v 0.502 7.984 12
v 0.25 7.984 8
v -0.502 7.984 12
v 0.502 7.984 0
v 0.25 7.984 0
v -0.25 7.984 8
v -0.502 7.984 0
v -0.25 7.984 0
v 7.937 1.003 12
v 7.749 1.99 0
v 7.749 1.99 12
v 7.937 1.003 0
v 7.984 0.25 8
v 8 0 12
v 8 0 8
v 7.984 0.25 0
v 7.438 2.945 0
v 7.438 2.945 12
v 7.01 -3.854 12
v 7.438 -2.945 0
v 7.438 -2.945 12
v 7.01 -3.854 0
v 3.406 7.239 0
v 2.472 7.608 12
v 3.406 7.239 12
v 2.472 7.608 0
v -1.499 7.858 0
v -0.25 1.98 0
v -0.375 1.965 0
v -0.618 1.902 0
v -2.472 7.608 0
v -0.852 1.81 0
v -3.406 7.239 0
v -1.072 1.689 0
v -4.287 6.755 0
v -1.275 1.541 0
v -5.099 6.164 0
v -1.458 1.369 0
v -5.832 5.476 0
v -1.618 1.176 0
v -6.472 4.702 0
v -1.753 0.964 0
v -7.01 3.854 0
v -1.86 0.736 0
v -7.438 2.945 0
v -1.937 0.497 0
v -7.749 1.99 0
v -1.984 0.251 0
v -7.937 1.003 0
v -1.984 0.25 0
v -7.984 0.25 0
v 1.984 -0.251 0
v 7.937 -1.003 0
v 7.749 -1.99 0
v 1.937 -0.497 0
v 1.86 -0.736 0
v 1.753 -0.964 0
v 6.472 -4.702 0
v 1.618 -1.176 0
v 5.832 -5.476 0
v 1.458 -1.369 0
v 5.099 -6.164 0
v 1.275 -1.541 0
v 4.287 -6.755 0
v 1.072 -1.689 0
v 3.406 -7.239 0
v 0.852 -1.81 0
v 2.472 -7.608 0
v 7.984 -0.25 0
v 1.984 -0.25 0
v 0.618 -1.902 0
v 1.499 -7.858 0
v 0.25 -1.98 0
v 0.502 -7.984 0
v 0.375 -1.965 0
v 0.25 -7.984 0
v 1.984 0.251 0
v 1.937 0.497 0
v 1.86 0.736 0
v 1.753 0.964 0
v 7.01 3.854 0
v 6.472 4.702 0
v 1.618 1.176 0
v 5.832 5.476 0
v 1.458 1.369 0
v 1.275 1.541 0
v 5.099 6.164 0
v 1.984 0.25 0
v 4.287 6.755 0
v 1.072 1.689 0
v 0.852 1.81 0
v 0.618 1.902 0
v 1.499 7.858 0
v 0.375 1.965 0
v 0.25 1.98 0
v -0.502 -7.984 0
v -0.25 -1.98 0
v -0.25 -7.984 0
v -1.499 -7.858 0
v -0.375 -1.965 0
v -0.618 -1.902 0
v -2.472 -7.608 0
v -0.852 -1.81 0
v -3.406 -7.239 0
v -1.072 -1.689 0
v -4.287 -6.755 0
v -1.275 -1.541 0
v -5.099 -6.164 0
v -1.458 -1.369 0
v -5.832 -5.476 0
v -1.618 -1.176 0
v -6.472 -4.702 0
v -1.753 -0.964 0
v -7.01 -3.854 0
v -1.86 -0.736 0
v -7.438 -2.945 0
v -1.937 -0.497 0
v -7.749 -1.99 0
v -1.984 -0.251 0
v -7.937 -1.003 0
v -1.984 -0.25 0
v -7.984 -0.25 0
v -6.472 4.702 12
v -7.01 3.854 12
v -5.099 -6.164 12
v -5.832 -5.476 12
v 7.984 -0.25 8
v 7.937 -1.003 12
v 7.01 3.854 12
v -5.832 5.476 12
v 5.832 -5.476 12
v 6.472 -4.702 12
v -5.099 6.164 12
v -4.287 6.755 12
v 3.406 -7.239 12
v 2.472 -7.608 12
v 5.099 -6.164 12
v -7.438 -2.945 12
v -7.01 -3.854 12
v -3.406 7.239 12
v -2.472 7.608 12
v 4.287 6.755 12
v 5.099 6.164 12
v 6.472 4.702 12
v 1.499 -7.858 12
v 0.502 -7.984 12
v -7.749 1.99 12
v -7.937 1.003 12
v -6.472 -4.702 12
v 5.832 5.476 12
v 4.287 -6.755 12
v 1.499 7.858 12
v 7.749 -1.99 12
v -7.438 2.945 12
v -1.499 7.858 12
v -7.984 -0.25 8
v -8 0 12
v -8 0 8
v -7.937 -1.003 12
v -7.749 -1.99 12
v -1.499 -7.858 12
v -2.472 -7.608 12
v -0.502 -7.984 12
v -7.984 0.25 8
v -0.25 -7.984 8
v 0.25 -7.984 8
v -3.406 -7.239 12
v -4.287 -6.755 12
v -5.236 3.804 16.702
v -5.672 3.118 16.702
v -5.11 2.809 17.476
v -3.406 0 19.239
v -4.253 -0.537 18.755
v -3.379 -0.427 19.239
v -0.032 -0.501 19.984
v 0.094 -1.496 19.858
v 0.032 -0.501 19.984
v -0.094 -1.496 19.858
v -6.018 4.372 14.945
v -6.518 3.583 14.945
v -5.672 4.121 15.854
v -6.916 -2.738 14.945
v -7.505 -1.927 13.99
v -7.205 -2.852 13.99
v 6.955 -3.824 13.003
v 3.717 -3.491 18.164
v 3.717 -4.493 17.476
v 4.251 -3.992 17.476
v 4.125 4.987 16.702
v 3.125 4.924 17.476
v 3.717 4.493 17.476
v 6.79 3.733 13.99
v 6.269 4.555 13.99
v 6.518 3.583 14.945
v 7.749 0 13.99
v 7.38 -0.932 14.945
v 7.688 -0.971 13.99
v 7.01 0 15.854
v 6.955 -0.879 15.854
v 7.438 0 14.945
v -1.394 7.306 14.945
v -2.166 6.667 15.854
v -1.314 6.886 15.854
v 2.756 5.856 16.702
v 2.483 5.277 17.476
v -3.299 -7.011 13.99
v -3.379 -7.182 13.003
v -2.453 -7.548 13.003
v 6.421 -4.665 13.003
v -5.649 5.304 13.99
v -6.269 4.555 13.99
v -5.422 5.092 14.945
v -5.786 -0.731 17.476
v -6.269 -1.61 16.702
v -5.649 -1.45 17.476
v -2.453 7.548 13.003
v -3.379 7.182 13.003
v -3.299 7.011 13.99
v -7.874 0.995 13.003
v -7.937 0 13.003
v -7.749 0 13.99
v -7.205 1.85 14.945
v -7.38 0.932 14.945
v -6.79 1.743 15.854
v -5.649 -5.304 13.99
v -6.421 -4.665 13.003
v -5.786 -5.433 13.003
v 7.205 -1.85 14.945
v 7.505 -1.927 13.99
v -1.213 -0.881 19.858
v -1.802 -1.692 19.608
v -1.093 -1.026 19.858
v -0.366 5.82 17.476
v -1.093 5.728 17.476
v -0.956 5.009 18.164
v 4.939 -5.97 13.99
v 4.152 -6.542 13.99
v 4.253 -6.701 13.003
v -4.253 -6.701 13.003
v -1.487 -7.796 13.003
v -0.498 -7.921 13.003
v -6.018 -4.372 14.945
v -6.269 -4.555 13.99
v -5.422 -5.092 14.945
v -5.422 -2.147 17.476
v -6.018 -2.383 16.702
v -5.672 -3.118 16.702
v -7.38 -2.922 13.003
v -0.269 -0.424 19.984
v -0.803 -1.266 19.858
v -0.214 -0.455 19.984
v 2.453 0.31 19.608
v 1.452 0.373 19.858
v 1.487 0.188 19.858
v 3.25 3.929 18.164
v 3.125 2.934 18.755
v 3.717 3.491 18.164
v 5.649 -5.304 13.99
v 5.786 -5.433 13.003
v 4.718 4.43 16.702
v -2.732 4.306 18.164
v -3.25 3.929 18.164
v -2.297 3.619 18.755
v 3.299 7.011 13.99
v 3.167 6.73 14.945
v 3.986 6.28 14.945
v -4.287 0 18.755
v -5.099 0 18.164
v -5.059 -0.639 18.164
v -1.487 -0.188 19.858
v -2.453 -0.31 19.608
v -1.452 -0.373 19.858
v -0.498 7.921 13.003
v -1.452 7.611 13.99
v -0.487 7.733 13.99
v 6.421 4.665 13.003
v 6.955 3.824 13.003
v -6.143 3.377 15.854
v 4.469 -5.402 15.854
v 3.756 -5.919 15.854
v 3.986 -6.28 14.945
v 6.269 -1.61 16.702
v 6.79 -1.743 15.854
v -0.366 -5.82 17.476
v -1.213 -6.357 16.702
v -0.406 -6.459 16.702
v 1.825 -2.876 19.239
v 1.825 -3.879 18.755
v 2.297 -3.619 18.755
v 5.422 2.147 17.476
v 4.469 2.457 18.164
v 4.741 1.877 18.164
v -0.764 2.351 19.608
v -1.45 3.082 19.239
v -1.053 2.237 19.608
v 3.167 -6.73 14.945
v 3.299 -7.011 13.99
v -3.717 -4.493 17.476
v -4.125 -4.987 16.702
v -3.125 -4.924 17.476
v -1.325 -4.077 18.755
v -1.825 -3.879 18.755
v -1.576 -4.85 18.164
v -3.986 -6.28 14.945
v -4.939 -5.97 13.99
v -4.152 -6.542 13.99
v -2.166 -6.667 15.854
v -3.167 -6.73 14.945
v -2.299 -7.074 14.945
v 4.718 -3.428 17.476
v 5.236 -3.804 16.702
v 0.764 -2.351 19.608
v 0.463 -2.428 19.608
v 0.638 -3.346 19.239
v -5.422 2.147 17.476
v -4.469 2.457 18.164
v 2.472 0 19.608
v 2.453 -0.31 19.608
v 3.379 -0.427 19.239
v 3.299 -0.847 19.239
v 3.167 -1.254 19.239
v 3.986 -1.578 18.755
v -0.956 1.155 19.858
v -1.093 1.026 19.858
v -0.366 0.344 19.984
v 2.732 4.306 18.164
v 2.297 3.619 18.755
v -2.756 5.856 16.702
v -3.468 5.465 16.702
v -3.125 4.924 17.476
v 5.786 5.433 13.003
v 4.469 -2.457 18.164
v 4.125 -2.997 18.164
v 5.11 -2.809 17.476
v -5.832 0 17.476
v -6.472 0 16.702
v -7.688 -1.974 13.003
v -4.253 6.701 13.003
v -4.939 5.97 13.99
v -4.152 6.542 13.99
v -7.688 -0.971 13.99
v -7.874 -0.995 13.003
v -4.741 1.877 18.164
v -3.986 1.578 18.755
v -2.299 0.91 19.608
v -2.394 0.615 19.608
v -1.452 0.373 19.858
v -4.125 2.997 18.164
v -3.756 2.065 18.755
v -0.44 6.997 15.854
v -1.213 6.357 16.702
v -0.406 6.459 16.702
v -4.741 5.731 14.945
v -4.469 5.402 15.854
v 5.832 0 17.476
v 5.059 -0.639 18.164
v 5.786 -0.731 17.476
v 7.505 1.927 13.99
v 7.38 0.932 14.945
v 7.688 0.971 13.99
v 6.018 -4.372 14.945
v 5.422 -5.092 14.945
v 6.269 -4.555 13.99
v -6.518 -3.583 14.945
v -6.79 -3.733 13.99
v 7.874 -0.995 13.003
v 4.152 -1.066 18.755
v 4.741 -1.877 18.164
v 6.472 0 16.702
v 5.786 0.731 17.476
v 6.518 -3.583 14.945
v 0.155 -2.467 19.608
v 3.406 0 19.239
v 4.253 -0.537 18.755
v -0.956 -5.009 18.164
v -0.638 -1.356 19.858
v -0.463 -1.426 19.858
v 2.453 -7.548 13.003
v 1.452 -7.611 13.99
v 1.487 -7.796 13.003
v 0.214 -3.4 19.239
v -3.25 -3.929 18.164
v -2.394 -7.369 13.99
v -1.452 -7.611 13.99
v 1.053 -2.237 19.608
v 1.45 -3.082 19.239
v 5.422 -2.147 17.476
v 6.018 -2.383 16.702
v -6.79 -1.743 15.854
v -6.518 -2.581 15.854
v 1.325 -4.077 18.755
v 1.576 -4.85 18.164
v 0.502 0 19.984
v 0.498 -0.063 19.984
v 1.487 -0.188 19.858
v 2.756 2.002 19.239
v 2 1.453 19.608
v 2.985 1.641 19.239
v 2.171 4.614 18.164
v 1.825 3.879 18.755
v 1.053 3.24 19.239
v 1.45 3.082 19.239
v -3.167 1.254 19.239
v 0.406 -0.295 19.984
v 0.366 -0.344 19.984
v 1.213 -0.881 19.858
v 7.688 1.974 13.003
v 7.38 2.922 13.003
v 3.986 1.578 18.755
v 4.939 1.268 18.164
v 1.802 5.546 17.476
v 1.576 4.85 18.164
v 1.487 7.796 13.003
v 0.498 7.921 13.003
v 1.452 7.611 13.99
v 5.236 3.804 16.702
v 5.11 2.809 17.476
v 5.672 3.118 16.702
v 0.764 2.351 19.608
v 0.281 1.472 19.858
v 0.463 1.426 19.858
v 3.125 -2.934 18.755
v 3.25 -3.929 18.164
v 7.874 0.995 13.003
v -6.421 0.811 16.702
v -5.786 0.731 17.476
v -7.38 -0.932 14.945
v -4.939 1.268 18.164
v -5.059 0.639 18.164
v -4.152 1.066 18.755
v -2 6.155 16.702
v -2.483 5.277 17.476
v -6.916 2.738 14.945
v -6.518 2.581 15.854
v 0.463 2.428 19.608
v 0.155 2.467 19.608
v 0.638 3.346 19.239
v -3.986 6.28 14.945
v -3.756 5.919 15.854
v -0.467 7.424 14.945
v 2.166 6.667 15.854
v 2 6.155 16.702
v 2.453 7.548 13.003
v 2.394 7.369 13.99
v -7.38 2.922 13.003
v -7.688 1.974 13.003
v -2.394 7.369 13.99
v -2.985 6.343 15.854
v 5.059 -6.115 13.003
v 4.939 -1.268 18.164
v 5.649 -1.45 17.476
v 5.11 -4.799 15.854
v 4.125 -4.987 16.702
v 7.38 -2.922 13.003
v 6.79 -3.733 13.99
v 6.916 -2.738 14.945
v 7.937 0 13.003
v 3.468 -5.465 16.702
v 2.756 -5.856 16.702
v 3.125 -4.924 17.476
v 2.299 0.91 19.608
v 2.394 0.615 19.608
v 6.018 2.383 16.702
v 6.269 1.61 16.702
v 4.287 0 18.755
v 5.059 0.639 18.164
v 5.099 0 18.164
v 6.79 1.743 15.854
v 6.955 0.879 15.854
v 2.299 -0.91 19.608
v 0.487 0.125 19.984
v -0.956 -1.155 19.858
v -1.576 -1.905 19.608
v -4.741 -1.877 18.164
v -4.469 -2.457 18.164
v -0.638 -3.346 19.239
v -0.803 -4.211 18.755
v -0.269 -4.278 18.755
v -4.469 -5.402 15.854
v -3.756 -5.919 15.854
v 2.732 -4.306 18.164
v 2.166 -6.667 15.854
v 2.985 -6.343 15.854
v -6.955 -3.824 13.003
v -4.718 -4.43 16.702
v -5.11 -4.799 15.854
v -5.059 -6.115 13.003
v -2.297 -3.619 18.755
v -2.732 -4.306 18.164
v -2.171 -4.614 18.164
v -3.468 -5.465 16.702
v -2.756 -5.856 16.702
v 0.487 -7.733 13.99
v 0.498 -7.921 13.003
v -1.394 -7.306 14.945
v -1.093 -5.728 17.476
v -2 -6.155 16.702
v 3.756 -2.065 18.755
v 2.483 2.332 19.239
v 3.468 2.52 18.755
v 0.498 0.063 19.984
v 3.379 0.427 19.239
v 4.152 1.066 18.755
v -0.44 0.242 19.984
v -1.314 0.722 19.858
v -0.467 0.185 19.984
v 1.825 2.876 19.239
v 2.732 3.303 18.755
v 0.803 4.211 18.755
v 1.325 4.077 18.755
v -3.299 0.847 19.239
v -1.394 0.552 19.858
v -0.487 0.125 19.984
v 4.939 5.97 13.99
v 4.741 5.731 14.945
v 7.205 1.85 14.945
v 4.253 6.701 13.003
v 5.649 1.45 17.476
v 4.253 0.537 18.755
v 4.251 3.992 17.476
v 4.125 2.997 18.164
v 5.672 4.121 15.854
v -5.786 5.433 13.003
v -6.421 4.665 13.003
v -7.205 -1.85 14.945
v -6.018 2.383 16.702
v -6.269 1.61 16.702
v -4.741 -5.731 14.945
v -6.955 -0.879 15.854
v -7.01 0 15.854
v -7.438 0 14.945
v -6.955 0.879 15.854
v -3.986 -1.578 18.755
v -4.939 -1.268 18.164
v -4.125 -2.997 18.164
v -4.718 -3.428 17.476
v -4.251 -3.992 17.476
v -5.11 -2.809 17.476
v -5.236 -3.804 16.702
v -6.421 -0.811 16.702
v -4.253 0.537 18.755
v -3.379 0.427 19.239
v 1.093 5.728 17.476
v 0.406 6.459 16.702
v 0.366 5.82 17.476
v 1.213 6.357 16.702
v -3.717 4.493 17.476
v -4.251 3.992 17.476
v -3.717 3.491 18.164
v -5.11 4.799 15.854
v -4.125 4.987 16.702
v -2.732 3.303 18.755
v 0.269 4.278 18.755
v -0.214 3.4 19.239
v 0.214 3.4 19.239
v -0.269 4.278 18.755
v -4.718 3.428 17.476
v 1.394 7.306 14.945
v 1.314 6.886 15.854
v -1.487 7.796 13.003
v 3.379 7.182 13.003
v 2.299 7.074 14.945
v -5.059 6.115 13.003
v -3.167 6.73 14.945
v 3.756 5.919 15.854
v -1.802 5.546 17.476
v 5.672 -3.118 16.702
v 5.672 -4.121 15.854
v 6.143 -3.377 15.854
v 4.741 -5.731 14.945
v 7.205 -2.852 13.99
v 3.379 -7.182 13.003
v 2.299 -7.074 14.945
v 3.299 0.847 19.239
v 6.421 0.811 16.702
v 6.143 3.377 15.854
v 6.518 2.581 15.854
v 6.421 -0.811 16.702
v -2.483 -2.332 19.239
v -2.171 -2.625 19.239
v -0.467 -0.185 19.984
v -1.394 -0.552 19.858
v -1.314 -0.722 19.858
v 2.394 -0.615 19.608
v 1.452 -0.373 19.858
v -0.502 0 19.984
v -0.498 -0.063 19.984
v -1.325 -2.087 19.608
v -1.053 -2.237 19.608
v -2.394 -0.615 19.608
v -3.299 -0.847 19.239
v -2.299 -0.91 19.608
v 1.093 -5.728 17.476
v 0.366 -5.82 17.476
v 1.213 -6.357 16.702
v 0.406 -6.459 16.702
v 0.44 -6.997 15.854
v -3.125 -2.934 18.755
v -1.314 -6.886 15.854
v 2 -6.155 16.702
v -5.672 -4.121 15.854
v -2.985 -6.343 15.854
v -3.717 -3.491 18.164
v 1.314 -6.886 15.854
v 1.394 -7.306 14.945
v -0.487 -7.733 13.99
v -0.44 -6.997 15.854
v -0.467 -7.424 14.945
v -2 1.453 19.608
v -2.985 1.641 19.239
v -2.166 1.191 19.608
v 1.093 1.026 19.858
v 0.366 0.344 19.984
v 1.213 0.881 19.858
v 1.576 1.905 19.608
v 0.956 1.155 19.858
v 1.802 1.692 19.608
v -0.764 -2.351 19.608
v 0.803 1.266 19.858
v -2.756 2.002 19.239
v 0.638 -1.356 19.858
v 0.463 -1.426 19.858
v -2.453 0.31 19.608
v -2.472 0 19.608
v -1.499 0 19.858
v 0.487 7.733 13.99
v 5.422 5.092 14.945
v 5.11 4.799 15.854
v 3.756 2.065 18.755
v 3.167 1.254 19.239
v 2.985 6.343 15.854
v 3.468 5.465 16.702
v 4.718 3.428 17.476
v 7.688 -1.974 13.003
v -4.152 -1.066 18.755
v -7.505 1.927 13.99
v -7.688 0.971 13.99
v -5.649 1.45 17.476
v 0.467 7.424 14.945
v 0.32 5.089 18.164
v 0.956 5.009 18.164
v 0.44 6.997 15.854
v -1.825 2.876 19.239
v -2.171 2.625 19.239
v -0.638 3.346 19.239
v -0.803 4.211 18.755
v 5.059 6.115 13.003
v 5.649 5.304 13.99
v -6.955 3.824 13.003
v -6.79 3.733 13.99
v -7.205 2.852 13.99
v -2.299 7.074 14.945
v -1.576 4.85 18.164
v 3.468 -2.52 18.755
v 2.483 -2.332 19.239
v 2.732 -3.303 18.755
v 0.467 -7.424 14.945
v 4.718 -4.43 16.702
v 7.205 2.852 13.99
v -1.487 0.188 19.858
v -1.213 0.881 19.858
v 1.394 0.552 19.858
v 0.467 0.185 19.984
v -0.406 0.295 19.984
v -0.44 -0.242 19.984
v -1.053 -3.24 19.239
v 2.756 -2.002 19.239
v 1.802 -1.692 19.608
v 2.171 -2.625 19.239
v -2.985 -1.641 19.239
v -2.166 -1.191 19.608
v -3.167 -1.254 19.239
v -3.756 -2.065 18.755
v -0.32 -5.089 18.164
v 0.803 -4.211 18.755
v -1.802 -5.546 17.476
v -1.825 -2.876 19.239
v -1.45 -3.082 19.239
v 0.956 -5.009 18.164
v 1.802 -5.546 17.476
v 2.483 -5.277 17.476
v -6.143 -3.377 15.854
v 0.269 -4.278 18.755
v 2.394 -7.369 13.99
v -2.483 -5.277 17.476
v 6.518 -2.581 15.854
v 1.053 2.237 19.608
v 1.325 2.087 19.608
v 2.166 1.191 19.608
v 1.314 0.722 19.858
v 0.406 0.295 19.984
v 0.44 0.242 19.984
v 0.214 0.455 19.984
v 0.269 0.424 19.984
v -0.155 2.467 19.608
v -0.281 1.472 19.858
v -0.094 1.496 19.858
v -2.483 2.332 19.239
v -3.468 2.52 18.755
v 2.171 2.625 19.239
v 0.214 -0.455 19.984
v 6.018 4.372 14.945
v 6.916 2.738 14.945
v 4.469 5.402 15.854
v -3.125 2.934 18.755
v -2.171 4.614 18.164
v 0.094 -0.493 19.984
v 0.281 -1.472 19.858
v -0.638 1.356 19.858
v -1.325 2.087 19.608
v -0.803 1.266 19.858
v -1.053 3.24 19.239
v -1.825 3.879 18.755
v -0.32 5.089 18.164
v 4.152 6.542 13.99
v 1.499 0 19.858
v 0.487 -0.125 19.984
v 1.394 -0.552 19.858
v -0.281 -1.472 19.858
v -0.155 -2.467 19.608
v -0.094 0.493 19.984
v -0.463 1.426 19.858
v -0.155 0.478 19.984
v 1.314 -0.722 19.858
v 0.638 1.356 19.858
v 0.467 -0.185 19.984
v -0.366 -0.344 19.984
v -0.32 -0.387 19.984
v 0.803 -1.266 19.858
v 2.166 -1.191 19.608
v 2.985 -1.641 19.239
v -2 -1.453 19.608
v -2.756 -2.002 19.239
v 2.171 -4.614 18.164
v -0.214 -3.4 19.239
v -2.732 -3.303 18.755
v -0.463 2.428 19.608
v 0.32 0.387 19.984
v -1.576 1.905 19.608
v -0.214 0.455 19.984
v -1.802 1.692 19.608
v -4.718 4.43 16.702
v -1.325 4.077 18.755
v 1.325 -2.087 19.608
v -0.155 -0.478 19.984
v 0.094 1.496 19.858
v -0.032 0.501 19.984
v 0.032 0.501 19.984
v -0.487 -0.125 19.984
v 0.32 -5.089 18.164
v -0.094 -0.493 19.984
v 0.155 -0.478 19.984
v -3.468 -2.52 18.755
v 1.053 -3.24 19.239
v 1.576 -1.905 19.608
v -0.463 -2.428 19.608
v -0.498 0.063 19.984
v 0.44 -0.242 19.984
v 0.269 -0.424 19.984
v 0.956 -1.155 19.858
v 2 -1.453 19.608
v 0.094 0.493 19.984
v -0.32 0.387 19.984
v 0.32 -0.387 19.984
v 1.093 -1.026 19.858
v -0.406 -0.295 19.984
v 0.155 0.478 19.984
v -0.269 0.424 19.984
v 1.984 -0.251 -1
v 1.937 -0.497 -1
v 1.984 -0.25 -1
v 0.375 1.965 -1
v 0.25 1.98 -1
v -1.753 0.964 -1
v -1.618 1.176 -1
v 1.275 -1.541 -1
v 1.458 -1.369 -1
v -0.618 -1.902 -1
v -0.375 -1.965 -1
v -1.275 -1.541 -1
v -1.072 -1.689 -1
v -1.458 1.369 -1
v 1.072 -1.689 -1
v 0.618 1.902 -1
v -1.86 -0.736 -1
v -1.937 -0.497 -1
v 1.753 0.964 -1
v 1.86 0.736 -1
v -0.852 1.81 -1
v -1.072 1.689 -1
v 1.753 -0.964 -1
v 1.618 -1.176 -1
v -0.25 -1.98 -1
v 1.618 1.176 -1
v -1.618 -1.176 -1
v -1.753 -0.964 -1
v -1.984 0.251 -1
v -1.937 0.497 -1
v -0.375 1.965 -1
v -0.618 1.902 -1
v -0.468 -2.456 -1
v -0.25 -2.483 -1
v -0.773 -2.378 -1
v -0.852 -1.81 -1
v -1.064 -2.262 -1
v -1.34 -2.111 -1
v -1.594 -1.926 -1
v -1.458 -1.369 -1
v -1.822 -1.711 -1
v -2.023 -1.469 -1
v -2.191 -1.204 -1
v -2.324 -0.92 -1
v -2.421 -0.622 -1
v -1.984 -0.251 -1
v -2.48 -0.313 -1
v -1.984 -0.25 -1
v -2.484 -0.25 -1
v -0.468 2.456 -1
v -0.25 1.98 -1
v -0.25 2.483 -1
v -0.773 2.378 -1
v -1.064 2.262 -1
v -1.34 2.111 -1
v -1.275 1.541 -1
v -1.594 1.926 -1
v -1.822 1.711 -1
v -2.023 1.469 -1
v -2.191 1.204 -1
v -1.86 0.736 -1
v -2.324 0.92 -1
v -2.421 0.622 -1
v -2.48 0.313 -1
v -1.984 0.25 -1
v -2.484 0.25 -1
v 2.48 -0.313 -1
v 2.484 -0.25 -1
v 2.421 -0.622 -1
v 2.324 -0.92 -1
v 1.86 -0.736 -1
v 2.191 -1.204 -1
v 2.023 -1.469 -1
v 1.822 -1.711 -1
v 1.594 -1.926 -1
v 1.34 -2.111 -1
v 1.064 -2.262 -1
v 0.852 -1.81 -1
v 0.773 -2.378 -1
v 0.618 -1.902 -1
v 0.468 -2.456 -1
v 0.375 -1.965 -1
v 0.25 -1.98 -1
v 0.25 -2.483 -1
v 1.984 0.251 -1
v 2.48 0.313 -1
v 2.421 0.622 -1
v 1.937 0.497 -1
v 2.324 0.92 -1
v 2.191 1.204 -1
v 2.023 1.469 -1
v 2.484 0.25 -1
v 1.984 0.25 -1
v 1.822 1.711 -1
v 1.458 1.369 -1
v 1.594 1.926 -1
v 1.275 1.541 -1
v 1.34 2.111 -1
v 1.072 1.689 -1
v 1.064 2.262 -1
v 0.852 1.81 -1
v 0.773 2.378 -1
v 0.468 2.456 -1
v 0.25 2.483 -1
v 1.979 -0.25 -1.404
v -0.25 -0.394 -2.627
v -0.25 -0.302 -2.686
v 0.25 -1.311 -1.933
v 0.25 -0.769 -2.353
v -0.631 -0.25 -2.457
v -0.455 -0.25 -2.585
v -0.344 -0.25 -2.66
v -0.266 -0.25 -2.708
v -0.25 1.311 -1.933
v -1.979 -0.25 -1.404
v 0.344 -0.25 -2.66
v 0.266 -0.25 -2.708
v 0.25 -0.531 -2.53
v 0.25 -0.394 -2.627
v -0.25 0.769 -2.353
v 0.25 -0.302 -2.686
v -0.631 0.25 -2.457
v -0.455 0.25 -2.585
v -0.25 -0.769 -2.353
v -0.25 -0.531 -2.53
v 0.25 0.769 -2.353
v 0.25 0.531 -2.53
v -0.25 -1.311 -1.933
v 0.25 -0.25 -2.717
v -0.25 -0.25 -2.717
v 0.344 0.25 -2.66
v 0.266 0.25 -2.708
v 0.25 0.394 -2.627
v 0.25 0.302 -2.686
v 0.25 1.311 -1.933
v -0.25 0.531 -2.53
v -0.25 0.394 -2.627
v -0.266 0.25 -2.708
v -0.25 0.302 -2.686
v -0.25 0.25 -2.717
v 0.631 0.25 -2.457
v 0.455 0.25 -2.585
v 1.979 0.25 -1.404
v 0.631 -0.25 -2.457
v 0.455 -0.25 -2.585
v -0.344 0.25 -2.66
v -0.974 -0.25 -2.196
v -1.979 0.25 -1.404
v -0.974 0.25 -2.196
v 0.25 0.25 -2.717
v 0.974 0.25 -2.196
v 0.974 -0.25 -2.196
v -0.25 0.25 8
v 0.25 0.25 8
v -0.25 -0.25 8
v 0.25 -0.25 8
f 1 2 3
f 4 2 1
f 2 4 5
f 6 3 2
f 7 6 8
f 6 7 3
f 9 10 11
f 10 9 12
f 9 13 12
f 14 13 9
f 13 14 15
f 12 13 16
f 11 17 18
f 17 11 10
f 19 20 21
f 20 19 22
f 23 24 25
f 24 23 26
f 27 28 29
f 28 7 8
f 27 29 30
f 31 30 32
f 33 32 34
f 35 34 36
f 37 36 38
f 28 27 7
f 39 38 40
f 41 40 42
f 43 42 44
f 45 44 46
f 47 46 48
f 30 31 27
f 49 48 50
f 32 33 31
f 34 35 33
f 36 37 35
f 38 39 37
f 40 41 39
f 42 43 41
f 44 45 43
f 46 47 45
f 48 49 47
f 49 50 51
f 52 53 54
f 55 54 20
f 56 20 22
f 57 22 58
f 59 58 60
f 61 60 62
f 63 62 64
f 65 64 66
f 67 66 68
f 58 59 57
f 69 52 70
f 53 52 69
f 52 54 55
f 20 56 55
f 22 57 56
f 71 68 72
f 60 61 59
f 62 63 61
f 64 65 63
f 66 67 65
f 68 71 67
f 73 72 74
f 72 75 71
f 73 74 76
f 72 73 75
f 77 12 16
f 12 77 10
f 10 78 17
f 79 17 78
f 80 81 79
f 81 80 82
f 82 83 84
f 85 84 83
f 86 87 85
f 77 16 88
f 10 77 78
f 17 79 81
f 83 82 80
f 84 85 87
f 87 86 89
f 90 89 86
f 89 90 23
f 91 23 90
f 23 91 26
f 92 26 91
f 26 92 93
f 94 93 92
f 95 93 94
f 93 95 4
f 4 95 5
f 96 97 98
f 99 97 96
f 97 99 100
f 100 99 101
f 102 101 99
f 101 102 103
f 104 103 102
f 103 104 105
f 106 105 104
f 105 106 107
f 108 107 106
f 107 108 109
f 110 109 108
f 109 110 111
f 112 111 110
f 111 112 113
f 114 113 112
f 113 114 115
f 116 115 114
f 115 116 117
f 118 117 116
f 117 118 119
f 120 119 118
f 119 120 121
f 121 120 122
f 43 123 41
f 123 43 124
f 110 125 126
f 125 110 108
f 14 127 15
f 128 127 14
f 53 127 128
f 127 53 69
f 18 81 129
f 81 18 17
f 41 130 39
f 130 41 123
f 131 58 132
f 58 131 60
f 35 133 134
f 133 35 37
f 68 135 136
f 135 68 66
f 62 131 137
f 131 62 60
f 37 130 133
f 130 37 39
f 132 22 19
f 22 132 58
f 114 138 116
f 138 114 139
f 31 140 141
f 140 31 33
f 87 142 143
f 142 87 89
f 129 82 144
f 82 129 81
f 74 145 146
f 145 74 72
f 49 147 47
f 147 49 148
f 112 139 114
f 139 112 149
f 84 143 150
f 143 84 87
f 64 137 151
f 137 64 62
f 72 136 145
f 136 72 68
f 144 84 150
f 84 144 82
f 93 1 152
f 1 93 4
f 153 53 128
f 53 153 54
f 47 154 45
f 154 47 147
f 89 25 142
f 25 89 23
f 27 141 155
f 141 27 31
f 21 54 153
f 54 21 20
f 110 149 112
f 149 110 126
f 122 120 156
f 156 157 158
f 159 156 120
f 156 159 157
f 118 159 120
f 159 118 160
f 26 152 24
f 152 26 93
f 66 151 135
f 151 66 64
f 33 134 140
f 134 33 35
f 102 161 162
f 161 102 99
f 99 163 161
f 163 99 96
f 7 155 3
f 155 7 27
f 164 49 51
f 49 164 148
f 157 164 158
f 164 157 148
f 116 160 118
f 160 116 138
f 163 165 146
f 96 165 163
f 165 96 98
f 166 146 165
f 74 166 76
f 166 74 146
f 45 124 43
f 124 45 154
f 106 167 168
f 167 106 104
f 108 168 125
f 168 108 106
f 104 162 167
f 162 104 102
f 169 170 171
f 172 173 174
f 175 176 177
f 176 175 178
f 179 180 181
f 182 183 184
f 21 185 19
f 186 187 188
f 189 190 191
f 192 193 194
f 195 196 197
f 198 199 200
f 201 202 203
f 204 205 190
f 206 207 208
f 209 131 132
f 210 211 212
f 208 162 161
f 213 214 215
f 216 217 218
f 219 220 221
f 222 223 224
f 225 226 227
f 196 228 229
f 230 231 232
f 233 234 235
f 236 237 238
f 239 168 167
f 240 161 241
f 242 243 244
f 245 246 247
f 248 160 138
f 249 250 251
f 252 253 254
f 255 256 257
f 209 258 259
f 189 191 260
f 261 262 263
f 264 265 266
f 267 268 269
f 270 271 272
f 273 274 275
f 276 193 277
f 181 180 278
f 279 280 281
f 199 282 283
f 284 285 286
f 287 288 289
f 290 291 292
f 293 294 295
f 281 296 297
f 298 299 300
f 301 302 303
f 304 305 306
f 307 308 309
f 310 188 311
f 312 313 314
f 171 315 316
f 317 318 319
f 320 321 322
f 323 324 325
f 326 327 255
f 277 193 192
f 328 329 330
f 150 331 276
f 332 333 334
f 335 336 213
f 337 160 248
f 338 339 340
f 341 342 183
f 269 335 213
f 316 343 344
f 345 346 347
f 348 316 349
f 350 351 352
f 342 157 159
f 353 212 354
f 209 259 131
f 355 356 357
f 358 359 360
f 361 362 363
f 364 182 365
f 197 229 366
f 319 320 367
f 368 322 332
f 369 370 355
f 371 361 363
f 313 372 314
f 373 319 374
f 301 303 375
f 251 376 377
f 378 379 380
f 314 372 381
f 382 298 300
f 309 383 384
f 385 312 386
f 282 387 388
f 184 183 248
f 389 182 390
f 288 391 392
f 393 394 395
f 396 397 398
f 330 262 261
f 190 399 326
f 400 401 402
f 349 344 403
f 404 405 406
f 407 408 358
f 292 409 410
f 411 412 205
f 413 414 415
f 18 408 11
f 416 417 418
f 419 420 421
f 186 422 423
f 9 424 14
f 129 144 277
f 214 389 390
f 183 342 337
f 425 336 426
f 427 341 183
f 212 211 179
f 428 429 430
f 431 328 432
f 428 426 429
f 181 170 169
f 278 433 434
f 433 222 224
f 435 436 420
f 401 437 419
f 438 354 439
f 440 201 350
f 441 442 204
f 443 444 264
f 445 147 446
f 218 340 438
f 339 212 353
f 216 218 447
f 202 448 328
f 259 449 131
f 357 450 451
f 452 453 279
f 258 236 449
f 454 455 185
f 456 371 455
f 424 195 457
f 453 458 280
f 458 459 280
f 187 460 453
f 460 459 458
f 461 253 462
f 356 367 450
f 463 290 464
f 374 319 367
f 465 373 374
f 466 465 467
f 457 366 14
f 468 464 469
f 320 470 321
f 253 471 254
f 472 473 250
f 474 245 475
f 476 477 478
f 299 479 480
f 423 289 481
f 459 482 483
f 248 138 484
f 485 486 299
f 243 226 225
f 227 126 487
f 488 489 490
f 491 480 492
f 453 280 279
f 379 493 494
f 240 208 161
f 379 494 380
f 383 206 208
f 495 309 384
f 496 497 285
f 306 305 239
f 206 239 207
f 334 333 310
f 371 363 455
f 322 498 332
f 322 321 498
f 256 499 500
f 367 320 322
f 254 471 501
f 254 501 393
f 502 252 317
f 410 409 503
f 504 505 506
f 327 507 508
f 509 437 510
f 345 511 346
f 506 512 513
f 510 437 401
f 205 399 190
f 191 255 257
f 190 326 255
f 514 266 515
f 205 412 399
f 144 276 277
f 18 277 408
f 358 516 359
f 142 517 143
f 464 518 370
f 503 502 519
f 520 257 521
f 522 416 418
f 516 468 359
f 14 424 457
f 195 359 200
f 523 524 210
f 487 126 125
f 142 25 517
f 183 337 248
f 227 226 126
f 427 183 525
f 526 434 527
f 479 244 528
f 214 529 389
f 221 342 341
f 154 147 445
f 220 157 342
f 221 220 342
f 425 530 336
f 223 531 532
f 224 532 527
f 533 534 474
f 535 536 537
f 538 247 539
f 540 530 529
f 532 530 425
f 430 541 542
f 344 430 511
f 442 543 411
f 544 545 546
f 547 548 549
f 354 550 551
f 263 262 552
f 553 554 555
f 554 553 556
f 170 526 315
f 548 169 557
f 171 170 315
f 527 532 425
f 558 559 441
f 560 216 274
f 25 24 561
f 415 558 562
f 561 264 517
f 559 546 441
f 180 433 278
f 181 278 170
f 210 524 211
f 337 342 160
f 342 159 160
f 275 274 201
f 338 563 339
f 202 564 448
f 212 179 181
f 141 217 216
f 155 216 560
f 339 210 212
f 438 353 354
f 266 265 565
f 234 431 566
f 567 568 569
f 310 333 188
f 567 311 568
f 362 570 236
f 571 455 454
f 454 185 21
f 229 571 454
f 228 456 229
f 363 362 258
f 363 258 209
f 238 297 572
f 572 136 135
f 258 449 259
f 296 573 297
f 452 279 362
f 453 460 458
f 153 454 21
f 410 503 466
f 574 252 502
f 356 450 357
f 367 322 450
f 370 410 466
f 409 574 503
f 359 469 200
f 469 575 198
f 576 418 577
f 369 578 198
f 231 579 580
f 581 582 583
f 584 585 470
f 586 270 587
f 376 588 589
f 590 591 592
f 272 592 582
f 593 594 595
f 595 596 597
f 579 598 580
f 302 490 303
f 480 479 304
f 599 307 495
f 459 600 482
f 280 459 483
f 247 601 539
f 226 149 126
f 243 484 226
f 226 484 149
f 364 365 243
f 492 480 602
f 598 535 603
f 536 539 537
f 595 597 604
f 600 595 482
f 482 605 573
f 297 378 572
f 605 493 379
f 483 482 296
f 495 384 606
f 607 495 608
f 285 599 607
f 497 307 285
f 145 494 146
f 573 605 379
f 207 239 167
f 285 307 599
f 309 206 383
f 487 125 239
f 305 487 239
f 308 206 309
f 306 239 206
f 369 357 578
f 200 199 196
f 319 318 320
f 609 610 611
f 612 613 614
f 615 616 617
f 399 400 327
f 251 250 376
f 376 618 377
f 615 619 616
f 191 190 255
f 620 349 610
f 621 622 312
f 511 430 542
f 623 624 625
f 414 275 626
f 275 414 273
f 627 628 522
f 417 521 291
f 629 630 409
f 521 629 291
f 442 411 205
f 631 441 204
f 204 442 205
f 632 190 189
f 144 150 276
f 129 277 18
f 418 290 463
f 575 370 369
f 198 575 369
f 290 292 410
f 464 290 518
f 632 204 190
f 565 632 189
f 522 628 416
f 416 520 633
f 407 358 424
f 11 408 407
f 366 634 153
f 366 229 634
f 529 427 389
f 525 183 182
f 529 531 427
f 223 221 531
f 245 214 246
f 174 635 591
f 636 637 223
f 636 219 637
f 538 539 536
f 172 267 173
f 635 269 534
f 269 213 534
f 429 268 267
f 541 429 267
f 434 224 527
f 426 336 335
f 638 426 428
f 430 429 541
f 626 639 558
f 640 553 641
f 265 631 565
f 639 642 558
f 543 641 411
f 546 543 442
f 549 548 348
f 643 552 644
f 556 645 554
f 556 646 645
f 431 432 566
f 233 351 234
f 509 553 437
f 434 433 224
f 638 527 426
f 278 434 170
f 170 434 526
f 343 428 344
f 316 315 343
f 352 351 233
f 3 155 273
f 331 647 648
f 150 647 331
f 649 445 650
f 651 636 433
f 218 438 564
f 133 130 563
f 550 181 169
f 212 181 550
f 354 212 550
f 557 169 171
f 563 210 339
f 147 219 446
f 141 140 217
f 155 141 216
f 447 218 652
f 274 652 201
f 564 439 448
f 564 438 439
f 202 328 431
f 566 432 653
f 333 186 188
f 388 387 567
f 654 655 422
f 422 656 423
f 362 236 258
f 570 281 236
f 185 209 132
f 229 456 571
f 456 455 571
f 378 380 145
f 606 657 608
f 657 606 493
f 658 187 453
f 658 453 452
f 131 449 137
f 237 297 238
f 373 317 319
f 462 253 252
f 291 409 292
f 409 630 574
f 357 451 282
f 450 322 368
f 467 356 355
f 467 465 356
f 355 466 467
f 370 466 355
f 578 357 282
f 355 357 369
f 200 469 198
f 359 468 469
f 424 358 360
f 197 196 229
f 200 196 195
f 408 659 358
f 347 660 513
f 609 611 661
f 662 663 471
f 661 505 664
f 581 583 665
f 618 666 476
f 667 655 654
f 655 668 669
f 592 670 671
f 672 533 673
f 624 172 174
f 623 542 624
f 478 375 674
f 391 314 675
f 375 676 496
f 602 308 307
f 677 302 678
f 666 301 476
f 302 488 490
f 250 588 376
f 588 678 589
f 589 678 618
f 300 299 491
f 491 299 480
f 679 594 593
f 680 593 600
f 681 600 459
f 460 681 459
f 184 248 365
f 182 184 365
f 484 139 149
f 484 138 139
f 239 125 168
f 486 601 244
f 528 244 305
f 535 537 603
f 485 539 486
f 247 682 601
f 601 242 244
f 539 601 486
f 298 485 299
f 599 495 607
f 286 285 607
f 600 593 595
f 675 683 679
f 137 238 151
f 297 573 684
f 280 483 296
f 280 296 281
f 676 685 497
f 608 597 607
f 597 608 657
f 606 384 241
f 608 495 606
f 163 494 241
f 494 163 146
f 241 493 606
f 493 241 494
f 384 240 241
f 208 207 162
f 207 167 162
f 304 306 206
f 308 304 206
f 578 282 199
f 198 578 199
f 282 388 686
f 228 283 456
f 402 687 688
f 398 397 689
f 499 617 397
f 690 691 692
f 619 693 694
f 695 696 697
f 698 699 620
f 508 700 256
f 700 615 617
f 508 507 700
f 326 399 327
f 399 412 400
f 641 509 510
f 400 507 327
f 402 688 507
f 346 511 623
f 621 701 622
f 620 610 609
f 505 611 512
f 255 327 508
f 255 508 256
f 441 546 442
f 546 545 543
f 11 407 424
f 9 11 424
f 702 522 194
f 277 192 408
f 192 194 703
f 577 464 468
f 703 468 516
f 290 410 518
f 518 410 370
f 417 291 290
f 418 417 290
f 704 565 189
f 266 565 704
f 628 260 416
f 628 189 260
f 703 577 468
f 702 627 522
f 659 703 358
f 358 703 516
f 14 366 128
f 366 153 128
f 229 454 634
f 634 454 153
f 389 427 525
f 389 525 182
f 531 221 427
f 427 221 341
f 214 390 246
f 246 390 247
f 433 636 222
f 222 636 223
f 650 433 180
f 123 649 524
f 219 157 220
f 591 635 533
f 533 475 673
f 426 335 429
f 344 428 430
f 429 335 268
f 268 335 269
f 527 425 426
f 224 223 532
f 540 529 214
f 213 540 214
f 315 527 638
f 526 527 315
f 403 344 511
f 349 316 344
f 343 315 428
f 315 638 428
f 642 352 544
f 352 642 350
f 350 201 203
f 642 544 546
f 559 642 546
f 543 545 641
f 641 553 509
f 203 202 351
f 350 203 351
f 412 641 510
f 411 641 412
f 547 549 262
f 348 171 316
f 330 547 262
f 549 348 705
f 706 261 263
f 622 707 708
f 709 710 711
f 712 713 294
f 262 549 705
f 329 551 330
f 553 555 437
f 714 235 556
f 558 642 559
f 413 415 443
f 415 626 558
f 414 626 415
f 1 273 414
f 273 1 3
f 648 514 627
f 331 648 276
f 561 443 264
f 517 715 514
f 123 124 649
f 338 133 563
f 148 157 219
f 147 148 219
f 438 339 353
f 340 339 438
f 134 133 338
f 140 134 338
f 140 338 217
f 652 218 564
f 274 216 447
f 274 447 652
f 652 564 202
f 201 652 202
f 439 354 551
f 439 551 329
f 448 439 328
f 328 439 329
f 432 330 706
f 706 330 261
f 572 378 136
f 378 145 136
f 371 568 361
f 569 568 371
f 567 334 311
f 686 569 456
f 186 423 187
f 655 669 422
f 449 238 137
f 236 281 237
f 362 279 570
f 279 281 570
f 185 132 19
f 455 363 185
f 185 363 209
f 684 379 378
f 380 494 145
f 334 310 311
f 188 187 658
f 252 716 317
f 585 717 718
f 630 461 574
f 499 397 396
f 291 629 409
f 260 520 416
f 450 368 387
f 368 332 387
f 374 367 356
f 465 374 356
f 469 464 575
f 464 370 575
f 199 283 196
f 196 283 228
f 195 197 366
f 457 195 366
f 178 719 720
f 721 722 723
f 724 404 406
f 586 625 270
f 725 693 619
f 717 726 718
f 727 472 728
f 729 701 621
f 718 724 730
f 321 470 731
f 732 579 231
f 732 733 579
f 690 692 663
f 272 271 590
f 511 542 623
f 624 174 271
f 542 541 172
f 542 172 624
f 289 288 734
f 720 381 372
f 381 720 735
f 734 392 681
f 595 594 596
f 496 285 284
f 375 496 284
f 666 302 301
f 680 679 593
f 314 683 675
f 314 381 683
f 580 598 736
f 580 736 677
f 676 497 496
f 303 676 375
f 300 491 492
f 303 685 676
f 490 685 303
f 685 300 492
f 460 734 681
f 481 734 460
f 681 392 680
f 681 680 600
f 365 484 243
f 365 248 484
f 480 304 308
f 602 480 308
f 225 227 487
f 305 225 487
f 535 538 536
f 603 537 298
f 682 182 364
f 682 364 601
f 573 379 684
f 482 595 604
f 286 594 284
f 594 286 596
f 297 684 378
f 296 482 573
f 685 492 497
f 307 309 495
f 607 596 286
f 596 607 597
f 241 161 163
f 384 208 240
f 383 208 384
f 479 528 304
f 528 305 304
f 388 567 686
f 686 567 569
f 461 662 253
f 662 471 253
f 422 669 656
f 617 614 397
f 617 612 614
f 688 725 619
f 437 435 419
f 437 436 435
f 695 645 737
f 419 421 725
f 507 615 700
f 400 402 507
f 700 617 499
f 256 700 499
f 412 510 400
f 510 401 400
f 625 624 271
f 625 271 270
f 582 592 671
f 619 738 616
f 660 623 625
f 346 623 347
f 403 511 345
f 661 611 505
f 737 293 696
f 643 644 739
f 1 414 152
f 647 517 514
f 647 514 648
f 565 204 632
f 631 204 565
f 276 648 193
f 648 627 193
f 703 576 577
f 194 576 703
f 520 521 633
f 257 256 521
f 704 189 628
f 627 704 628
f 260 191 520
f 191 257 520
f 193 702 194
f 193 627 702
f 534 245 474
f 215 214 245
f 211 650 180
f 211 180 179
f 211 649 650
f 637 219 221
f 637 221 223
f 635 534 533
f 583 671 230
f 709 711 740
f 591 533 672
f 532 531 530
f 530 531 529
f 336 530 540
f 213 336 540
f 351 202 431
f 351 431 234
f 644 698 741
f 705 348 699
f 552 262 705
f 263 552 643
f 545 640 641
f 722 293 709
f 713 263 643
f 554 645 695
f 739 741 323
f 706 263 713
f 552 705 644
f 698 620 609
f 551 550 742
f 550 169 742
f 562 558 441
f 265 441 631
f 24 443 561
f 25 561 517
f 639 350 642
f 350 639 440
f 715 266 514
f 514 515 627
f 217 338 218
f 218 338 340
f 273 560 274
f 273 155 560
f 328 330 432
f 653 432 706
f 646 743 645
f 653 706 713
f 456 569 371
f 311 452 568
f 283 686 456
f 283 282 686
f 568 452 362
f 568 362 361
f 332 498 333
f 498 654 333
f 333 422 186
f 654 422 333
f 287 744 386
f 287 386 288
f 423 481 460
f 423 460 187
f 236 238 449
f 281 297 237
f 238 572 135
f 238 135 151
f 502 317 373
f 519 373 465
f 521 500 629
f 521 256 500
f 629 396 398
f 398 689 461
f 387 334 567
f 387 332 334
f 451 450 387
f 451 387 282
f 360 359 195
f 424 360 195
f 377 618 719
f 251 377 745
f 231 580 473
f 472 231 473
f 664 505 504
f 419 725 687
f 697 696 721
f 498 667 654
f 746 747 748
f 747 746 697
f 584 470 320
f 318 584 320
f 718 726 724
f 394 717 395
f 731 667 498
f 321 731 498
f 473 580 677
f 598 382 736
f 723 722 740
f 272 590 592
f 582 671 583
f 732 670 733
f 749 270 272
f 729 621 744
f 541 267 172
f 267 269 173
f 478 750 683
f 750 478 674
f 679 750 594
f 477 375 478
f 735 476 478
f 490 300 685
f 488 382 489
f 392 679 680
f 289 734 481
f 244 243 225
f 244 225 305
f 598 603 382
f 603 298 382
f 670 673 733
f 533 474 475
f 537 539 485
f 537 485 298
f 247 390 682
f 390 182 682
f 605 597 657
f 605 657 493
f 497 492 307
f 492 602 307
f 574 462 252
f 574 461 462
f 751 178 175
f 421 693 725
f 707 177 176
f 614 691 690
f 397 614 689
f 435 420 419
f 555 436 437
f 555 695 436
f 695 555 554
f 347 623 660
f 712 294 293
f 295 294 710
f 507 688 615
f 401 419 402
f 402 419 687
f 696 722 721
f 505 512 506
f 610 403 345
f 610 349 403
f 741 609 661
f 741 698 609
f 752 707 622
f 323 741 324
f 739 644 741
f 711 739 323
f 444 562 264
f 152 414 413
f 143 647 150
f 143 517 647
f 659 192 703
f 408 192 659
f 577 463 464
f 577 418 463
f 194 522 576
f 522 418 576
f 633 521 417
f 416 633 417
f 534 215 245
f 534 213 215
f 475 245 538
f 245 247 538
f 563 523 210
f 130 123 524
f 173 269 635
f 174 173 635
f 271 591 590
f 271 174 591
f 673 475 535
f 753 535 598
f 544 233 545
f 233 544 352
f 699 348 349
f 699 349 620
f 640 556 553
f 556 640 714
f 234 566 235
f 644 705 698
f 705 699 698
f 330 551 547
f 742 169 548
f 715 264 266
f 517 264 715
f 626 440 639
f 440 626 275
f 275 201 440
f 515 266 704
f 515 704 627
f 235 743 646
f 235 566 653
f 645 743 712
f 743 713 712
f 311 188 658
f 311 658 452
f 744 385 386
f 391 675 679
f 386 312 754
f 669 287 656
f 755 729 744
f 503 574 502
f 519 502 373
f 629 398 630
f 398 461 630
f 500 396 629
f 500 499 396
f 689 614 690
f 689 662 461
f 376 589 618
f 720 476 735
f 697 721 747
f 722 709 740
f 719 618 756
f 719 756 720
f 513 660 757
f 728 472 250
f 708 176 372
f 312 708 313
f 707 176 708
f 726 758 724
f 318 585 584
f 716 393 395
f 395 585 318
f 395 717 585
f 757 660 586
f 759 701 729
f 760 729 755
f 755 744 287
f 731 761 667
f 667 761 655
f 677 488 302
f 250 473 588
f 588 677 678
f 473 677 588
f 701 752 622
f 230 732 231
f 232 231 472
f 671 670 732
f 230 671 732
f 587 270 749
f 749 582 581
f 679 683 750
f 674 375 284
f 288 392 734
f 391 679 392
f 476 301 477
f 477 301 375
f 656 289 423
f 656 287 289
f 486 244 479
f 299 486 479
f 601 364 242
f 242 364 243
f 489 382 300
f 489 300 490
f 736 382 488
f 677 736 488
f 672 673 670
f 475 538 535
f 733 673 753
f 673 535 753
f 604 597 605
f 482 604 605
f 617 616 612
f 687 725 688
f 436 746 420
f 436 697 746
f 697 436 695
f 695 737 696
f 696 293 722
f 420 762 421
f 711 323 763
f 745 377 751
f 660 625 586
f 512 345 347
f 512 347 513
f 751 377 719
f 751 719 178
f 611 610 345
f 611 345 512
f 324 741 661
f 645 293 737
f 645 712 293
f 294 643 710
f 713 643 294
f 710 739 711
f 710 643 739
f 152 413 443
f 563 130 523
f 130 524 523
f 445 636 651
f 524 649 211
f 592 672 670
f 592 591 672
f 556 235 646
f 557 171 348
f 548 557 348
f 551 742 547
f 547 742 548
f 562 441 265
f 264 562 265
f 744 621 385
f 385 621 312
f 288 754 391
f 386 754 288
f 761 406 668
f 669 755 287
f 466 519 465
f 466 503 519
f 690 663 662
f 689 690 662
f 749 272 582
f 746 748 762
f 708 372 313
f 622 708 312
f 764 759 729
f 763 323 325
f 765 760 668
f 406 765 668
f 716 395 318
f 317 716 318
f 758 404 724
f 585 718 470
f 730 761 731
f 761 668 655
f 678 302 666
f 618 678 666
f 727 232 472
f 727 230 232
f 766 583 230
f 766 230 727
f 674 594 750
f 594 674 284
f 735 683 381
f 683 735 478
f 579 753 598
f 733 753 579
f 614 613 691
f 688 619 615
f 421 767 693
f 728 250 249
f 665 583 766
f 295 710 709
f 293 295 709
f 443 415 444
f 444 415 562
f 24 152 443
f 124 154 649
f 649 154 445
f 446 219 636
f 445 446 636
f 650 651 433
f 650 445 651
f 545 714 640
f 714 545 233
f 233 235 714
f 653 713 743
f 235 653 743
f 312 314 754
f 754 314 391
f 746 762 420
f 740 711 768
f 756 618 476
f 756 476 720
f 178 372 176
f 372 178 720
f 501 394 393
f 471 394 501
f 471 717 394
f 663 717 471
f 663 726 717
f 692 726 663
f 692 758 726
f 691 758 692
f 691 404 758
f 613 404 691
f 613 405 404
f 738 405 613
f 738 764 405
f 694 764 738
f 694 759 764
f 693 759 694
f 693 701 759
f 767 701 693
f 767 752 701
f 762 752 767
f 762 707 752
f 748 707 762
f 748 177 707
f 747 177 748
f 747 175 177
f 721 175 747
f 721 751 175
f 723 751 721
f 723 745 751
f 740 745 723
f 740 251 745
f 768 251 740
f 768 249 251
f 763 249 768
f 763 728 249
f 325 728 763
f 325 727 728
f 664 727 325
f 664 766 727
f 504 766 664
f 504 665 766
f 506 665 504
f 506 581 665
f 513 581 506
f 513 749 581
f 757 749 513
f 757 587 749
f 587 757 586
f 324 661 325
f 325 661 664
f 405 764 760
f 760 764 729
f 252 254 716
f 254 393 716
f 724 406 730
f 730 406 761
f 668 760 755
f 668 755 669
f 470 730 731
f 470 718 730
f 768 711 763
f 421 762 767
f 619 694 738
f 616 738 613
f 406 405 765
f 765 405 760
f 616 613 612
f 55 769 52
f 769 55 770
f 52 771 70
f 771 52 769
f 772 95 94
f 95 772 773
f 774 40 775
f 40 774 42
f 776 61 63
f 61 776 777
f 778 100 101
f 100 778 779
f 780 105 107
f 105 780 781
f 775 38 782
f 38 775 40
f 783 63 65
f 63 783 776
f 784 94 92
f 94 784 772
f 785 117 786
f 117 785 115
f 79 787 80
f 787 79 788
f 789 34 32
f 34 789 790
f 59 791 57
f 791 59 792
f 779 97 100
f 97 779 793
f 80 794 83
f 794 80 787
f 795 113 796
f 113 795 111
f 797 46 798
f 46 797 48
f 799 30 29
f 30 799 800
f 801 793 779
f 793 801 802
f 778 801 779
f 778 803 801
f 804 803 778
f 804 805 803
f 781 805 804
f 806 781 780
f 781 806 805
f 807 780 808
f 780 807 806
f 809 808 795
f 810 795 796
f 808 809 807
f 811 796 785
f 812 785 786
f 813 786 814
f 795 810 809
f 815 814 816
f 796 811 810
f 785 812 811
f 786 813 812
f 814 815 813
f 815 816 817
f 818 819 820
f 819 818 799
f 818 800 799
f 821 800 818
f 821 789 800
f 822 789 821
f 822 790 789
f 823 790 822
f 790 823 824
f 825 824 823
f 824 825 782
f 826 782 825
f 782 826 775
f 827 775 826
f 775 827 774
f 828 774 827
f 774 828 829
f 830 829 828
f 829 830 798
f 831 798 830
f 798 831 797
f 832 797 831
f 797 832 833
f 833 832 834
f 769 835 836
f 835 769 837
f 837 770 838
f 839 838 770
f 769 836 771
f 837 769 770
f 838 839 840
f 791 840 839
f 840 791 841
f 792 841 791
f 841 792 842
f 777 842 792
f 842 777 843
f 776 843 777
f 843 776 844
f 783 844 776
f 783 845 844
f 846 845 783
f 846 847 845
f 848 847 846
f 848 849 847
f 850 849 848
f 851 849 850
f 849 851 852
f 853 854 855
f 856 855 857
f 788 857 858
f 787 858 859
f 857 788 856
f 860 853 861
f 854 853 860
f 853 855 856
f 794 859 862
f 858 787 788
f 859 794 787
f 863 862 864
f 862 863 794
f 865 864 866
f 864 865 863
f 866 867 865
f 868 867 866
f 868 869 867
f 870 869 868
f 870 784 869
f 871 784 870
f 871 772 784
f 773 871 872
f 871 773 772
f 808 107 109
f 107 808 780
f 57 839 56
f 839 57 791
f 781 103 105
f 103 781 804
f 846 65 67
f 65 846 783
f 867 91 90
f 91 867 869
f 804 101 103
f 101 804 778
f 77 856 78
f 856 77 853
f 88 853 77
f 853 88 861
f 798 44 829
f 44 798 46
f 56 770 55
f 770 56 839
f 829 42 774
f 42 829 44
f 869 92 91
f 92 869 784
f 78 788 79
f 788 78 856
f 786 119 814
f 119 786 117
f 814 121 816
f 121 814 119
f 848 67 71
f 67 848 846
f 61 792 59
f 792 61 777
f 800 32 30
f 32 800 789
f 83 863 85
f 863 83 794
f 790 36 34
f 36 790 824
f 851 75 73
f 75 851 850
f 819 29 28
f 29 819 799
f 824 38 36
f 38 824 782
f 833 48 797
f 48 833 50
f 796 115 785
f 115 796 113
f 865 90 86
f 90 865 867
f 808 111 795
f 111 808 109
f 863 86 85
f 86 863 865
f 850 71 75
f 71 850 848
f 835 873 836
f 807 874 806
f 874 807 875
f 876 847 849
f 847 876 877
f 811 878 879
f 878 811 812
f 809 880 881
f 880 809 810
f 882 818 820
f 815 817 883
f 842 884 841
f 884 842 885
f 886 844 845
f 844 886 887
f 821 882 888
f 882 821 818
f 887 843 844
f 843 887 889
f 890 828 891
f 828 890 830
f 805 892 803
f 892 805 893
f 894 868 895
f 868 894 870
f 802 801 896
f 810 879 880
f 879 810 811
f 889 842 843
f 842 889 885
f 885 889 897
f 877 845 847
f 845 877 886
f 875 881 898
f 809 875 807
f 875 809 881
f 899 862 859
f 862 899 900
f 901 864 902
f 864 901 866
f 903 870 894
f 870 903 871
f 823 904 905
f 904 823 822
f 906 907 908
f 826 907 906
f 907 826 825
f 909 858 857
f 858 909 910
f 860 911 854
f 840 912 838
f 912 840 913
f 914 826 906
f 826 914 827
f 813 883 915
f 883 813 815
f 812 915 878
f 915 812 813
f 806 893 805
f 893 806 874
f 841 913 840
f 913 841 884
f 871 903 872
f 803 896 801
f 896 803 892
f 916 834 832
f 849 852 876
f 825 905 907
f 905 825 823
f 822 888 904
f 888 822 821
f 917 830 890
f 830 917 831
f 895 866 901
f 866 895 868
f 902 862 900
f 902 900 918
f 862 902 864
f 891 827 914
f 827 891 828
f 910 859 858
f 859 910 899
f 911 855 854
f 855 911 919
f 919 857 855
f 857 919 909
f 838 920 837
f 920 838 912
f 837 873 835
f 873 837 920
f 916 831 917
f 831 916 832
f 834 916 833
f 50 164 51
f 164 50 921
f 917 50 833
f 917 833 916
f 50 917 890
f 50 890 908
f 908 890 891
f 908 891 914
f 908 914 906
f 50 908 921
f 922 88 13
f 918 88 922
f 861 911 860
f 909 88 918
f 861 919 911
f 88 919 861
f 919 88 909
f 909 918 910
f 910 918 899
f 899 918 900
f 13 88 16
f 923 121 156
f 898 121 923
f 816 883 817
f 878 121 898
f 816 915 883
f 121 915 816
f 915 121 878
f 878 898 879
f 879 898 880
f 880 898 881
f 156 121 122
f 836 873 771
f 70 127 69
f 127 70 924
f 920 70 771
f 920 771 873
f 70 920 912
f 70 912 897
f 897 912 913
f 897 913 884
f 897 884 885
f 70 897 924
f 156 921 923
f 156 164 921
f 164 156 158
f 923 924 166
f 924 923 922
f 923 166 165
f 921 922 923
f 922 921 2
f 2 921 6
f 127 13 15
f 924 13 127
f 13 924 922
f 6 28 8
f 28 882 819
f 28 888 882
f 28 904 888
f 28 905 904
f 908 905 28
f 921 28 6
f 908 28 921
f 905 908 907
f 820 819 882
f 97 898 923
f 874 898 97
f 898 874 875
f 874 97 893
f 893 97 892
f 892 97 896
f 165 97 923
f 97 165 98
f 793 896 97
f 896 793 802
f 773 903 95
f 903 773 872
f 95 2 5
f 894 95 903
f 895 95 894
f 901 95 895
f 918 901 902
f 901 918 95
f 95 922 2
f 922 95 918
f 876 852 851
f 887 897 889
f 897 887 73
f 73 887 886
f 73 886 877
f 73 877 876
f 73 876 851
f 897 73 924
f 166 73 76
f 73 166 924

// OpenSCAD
foot_radius = 8;
foot_height = 20;
hook_inner_diameter = 4;
hook_outer_diameter = 5;
hook_height = 2;
hooked_plate_thickness = 1;
hook_gap = 0.5;
gap_depth_in_foot = 8;
$fn = 50;
cut_plate_height = gap_depth_in_foot + hook_height + hooked_plate_thickness;
cut_plate_width = foot_radius*2;
difference()
{
    union()
    {
        cylinder(h= foot_height-foot_radius, r=foot_radius, center = false);
        translate([0,0,foot_height-foot_radius])
            sphere(r= foot_radius);

        rotate([180, 0, 0])
            cylinder(h = hooked_plate_thickness, r=hook_inner_diameter/2, center=false);

        translate([0,0,-hooked_plate_thickness])
            rotate([180, 0, 0])
                cylinder(hook_height, hook_outer_diameter/2, 0, center = false);
    }
    union()
    {
        translate([-foot_radius,-hook_gap/2,gap_depth_in_foot])
            rotate([270, 0, 0])
            cube([cut_plate_width, cut_plate_height, hook_gap], center=false);

        translate([hook_gap/2,-foot_radius,gap_depth_in_foot])
            rotate([270, 0, 90])
            cube([cut_plate_width, cut_plate_height, hook_gap], center=false);
    }
}
